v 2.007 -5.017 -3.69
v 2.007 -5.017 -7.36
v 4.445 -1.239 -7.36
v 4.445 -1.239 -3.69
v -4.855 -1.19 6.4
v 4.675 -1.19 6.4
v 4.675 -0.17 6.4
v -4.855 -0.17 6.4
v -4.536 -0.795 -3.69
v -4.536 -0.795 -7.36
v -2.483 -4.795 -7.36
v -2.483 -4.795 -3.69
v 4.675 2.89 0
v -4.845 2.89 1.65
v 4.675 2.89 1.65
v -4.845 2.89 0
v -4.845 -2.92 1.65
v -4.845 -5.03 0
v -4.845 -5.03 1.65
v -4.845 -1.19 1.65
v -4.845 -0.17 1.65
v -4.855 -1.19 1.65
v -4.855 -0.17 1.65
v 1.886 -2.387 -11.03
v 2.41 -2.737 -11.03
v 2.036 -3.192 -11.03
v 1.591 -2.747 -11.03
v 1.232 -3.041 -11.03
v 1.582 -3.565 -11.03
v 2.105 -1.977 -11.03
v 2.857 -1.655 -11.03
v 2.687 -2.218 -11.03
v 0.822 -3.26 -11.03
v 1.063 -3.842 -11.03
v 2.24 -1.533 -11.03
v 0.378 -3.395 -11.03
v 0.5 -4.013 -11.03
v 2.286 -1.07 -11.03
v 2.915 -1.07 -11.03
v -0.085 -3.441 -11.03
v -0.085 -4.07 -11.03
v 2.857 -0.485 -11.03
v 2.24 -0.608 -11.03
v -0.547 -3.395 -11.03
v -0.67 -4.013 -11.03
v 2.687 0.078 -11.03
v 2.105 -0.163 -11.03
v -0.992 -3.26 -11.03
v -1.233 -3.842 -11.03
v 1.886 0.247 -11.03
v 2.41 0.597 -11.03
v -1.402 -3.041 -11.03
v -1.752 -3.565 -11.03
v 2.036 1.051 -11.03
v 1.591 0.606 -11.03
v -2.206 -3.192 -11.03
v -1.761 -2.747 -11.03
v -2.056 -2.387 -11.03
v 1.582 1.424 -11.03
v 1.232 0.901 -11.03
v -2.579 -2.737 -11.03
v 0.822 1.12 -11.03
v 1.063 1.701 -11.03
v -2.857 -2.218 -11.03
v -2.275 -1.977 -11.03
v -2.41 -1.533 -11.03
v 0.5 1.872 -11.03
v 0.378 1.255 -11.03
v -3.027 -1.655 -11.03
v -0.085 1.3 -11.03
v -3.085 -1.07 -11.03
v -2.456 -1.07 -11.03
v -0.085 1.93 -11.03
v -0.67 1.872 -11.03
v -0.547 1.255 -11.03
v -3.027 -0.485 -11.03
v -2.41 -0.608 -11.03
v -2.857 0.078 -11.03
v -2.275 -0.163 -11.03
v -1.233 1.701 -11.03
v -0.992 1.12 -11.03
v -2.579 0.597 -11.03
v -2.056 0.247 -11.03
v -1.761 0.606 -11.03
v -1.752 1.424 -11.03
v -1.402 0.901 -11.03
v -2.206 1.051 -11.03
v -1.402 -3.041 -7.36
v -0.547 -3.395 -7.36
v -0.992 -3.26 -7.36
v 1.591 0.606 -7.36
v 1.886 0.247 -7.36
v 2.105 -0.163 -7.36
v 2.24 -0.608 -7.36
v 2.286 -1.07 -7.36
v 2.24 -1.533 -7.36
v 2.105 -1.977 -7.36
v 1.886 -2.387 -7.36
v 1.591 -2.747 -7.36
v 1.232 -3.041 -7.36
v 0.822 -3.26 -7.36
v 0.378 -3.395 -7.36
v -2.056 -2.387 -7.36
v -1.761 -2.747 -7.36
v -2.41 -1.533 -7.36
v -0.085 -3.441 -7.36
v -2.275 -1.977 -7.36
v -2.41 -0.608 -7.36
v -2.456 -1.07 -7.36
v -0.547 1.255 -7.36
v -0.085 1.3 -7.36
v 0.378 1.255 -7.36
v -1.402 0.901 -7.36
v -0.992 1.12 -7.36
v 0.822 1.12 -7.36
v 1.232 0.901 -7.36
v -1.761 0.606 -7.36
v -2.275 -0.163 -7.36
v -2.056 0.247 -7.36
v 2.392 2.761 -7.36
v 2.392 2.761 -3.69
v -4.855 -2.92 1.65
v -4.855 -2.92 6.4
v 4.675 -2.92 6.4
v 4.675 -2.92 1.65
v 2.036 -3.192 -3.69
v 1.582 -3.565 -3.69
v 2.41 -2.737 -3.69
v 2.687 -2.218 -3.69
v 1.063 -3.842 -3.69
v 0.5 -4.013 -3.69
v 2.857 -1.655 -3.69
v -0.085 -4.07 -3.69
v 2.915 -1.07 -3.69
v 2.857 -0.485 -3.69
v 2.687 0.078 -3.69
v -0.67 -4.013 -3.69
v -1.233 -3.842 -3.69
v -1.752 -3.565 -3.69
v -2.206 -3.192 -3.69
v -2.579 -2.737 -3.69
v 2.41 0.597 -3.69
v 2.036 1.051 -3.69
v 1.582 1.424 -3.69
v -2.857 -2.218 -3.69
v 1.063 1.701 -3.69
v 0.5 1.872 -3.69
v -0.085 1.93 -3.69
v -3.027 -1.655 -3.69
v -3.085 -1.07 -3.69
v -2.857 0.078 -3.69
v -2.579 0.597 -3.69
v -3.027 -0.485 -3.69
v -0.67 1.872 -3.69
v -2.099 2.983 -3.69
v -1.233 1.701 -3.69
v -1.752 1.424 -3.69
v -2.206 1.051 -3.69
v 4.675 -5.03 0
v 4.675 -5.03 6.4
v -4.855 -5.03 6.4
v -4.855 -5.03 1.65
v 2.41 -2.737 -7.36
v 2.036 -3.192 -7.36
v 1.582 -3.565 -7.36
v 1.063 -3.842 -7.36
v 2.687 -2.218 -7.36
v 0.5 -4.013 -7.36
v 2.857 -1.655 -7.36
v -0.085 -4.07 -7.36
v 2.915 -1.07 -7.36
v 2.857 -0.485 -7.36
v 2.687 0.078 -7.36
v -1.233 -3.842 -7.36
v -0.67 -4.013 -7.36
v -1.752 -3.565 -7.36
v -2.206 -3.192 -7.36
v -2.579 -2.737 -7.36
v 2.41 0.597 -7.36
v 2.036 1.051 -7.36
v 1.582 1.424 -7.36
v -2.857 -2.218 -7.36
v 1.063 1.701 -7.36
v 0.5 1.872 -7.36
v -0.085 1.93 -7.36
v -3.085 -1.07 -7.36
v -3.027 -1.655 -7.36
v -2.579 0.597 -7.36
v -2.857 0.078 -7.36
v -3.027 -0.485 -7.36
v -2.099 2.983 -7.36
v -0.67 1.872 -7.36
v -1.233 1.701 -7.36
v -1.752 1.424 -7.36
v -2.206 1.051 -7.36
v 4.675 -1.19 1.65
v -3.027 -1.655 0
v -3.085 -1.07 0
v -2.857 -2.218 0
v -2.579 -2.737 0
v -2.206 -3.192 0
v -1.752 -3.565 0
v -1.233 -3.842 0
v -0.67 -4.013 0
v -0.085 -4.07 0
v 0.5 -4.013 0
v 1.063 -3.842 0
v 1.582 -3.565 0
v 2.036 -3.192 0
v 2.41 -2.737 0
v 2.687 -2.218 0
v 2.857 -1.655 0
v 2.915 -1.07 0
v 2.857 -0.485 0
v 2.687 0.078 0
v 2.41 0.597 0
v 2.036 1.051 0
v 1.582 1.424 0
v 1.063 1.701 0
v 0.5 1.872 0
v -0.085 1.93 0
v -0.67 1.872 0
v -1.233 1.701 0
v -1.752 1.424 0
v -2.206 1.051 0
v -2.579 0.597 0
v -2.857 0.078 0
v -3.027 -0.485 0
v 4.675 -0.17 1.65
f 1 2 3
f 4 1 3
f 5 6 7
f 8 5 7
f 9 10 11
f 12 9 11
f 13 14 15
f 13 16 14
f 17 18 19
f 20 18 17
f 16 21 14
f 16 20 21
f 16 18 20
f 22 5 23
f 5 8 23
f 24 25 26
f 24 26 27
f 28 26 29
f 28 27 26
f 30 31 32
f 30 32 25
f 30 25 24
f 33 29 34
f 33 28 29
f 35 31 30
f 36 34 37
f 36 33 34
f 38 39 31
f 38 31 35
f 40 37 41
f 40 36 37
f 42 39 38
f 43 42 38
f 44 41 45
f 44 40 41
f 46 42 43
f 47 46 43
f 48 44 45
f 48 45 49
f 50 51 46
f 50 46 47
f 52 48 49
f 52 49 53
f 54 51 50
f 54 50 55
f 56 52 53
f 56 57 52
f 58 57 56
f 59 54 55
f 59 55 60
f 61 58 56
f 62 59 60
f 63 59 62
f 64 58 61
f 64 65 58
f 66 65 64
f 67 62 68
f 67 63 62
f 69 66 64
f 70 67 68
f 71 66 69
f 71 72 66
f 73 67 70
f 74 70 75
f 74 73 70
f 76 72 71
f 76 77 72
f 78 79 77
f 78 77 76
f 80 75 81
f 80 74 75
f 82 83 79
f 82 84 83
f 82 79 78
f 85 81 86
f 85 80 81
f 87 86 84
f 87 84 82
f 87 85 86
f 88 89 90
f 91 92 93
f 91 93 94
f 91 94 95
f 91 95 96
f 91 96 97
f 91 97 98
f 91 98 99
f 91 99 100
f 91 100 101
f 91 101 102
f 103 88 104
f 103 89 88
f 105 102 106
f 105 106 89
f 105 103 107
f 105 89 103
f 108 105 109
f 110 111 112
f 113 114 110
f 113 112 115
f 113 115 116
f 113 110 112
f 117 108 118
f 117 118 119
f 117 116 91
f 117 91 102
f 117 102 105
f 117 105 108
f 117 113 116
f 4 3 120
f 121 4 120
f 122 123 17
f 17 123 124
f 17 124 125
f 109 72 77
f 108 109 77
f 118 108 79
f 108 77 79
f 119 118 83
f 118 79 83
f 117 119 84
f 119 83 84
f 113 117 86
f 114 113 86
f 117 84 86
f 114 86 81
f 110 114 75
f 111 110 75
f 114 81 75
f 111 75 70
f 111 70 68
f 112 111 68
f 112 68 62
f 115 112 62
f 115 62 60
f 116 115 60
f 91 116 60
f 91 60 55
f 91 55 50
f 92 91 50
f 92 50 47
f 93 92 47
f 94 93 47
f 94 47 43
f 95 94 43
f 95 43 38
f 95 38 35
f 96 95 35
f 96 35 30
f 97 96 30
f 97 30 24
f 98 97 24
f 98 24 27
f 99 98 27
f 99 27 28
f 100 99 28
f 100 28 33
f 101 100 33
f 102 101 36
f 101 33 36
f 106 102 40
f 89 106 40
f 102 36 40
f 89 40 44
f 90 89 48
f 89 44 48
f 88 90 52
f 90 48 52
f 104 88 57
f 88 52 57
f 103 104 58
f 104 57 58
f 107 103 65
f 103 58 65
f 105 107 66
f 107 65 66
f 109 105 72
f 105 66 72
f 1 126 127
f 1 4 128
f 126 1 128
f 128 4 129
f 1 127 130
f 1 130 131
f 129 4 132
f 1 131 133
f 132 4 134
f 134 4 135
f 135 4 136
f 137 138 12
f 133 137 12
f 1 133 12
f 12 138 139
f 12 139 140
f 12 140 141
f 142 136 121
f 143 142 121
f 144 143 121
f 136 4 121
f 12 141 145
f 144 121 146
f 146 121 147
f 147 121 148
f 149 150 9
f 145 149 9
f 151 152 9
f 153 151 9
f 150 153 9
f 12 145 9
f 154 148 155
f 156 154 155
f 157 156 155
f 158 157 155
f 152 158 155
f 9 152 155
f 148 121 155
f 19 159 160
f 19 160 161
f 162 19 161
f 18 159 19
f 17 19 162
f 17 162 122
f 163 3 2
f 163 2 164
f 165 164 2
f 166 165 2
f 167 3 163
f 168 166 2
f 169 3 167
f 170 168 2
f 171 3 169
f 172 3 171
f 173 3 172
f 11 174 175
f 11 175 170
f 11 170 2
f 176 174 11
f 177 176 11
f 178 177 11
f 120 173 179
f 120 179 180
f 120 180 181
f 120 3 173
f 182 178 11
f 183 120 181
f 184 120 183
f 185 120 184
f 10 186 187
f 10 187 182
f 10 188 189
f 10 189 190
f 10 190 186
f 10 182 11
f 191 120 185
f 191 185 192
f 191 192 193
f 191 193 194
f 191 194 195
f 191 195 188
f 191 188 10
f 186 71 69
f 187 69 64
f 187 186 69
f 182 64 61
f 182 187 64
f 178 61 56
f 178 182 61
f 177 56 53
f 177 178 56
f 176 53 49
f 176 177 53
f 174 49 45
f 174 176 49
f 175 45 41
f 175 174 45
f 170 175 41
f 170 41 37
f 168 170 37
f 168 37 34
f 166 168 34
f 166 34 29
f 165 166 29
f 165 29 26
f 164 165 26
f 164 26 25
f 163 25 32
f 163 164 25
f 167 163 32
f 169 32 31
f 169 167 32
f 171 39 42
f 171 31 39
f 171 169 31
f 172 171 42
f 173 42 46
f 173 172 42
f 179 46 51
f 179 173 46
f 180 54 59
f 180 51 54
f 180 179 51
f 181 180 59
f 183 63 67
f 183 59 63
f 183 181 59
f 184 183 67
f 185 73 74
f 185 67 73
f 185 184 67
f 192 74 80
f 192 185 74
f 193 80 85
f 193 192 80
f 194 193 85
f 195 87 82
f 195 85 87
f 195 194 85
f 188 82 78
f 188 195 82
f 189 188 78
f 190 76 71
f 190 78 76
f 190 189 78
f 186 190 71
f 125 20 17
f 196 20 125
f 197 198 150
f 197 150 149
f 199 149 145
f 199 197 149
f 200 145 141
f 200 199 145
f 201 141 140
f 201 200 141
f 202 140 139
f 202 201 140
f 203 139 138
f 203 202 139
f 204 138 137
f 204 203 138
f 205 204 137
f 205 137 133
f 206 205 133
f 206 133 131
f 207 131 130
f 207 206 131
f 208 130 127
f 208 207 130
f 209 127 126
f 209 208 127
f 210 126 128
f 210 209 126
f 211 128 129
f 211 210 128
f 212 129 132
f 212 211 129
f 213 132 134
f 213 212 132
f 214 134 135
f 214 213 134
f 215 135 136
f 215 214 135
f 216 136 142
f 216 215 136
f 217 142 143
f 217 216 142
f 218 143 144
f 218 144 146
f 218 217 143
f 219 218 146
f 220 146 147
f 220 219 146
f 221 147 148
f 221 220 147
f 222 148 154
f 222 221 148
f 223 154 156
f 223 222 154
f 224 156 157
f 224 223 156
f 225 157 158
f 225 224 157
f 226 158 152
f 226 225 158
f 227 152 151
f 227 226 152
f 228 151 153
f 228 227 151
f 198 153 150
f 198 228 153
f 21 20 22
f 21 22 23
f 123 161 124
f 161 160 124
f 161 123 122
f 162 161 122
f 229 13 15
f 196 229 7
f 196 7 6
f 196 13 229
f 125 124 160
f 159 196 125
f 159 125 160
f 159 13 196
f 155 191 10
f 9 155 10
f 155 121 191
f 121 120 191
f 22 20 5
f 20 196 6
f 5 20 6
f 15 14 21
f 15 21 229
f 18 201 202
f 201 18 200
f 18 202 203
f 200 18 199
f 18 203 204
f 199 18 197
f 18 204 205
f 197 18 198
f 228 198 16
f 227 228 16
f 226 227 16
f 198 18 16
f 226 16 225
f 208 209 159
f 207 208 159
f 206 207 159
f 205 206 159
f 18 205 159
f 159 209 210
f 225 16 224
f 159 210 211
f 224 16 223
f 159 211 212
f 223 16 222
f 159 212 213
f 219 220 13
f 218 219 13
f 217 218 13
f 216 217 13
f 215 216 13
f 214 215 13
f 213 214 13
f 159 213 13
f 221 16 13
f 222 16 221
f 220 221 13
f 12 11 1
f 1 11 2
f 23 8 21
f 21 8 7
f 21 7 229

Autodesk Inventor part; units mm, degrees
ref_plane "YZ Plane" through (0, 0, 0) normal (1, 0, 0) x (0, 1, 0)
ref_plane "XZ Plane" through (0, 0, 0) normal (0, 1, 0) x (-1, 0, 0)
ref_plane "XY Plane" through (0, 0, 0) normal (0, 0, 1) x (1, 0, 0)
sketch "Sketch1" plane through (0, 0, 0) normal (0, 0, 1) x (1, 0, 0)
  line L0 (-4.8449, 2.8898) -> (4.6751, 2.8898)
  line L1 (4.6751, 2.8898) -> (4.6751, -5.0302)
  line L2 (4.6751, -5.0302) -> (-4.8449, -5.0302)
  line L3 (-4.8449, -5.0302) -> (-4.8449, 2.8898)
  point P0 (0, 0)
  dimension "d0" = 9.52
  dimension "d1" = 7.92
extrude "Extrusion1" add sketch "Sketch1" along normal blind 1.65
sketch "Sketch2" plane through (4.6751, -5.0302, 0) normal (1, 0, 0) x (0, 0, -1)
  line L0 (-1.65, 0) -> (-1.65, 7.92) projected
  line L1 (-1.65, 3.84) -> (-6.4, 3.84)
  line L2 (-6.4, 3.84) -> (-6.4, 4.86)
  line L3 (-6.4, 4.86) -> (-1.65, 4.86)
  line L4 (-1.65, 4.86) -> (-1.65, 3.84)
  line L5 (-1.65, 0) -> (-6.4, 0)
  line L6 (-6.4, 0) -> (-6.4, 2.11)
  line L7 (-6.4, 2.11) -> (-1.65, 2.11)
  line L8 (-1.65, 2.11) -> (-1.65, 0)
  point P0 (0, 5.0302)
  dimension "d4" = 1.73
  dimension "d5" = 2.11
  dimension "d6" = 1.02
  dimension "d7" = 4.75
  dimension "d8" = 4.75
extrude "Extrusion2" add sketch "Sketch2" against normal blind 9.53
sketch "Sketch3" plane through (0, 0, 0) normal (0, 0, -1) x (-1, 0, 0)
  circle A0 centre (0.0849, -1.0702) radius 3
  point P0 (0, 0)
  dimension "d11" = 6
extrude "Extrusion3" add sketch "Sketch3" along normal blind 11.03
ref_plane "Work Plane1" through (-0.0849, -1.0702, -7.36) normal (0, 0, -1) x (-1, 0, 0)
sketch "Sketch4" plane through (-0.0849, -1.0702, -7.36) normal (0, 0, -1) x (-1, 0, 0)
  line L0 (4.4515, 0.275) -> (2.3983, -3.725)
  line L1 (2.3983, -3.725) -> (-2.0924, -3.9469)
  line L2 (-2.0924, -3.9469) -> (-4.5299, -0.1688)
  line L3 (-4.5299, -0.1688) -> (-2.4767, 3.8312)
  line L4 (-2.4767, 3.8312) -> (2.014, 4.0531)
  line L5 (2.014, 4.0531) -> (4.4515, 0.275)
  point P0 (-0.0849, 1.0702)
  point P1 (-0.0392, 0.0531)
  dimension "d15" = 4
extrude "Extrusion4" add sketch "Sketch4" against normal blind 3.67
sketch "Sketch5" plane through (-0.0849, -1.0702, -11.03) normal (0, 0, -1) x (-1, 0, 0)
  circle A0 centre (0, 0) radius 3 projected
  circle A1 centre (0, 0) radius 2.3707
  point P0 (-0.0849, 1.0702)
extrude "Extrusion5" cut sketch "Sketch5" against normal blind 3.67 contours A1
properties part number "SMA_EdgeMale"
